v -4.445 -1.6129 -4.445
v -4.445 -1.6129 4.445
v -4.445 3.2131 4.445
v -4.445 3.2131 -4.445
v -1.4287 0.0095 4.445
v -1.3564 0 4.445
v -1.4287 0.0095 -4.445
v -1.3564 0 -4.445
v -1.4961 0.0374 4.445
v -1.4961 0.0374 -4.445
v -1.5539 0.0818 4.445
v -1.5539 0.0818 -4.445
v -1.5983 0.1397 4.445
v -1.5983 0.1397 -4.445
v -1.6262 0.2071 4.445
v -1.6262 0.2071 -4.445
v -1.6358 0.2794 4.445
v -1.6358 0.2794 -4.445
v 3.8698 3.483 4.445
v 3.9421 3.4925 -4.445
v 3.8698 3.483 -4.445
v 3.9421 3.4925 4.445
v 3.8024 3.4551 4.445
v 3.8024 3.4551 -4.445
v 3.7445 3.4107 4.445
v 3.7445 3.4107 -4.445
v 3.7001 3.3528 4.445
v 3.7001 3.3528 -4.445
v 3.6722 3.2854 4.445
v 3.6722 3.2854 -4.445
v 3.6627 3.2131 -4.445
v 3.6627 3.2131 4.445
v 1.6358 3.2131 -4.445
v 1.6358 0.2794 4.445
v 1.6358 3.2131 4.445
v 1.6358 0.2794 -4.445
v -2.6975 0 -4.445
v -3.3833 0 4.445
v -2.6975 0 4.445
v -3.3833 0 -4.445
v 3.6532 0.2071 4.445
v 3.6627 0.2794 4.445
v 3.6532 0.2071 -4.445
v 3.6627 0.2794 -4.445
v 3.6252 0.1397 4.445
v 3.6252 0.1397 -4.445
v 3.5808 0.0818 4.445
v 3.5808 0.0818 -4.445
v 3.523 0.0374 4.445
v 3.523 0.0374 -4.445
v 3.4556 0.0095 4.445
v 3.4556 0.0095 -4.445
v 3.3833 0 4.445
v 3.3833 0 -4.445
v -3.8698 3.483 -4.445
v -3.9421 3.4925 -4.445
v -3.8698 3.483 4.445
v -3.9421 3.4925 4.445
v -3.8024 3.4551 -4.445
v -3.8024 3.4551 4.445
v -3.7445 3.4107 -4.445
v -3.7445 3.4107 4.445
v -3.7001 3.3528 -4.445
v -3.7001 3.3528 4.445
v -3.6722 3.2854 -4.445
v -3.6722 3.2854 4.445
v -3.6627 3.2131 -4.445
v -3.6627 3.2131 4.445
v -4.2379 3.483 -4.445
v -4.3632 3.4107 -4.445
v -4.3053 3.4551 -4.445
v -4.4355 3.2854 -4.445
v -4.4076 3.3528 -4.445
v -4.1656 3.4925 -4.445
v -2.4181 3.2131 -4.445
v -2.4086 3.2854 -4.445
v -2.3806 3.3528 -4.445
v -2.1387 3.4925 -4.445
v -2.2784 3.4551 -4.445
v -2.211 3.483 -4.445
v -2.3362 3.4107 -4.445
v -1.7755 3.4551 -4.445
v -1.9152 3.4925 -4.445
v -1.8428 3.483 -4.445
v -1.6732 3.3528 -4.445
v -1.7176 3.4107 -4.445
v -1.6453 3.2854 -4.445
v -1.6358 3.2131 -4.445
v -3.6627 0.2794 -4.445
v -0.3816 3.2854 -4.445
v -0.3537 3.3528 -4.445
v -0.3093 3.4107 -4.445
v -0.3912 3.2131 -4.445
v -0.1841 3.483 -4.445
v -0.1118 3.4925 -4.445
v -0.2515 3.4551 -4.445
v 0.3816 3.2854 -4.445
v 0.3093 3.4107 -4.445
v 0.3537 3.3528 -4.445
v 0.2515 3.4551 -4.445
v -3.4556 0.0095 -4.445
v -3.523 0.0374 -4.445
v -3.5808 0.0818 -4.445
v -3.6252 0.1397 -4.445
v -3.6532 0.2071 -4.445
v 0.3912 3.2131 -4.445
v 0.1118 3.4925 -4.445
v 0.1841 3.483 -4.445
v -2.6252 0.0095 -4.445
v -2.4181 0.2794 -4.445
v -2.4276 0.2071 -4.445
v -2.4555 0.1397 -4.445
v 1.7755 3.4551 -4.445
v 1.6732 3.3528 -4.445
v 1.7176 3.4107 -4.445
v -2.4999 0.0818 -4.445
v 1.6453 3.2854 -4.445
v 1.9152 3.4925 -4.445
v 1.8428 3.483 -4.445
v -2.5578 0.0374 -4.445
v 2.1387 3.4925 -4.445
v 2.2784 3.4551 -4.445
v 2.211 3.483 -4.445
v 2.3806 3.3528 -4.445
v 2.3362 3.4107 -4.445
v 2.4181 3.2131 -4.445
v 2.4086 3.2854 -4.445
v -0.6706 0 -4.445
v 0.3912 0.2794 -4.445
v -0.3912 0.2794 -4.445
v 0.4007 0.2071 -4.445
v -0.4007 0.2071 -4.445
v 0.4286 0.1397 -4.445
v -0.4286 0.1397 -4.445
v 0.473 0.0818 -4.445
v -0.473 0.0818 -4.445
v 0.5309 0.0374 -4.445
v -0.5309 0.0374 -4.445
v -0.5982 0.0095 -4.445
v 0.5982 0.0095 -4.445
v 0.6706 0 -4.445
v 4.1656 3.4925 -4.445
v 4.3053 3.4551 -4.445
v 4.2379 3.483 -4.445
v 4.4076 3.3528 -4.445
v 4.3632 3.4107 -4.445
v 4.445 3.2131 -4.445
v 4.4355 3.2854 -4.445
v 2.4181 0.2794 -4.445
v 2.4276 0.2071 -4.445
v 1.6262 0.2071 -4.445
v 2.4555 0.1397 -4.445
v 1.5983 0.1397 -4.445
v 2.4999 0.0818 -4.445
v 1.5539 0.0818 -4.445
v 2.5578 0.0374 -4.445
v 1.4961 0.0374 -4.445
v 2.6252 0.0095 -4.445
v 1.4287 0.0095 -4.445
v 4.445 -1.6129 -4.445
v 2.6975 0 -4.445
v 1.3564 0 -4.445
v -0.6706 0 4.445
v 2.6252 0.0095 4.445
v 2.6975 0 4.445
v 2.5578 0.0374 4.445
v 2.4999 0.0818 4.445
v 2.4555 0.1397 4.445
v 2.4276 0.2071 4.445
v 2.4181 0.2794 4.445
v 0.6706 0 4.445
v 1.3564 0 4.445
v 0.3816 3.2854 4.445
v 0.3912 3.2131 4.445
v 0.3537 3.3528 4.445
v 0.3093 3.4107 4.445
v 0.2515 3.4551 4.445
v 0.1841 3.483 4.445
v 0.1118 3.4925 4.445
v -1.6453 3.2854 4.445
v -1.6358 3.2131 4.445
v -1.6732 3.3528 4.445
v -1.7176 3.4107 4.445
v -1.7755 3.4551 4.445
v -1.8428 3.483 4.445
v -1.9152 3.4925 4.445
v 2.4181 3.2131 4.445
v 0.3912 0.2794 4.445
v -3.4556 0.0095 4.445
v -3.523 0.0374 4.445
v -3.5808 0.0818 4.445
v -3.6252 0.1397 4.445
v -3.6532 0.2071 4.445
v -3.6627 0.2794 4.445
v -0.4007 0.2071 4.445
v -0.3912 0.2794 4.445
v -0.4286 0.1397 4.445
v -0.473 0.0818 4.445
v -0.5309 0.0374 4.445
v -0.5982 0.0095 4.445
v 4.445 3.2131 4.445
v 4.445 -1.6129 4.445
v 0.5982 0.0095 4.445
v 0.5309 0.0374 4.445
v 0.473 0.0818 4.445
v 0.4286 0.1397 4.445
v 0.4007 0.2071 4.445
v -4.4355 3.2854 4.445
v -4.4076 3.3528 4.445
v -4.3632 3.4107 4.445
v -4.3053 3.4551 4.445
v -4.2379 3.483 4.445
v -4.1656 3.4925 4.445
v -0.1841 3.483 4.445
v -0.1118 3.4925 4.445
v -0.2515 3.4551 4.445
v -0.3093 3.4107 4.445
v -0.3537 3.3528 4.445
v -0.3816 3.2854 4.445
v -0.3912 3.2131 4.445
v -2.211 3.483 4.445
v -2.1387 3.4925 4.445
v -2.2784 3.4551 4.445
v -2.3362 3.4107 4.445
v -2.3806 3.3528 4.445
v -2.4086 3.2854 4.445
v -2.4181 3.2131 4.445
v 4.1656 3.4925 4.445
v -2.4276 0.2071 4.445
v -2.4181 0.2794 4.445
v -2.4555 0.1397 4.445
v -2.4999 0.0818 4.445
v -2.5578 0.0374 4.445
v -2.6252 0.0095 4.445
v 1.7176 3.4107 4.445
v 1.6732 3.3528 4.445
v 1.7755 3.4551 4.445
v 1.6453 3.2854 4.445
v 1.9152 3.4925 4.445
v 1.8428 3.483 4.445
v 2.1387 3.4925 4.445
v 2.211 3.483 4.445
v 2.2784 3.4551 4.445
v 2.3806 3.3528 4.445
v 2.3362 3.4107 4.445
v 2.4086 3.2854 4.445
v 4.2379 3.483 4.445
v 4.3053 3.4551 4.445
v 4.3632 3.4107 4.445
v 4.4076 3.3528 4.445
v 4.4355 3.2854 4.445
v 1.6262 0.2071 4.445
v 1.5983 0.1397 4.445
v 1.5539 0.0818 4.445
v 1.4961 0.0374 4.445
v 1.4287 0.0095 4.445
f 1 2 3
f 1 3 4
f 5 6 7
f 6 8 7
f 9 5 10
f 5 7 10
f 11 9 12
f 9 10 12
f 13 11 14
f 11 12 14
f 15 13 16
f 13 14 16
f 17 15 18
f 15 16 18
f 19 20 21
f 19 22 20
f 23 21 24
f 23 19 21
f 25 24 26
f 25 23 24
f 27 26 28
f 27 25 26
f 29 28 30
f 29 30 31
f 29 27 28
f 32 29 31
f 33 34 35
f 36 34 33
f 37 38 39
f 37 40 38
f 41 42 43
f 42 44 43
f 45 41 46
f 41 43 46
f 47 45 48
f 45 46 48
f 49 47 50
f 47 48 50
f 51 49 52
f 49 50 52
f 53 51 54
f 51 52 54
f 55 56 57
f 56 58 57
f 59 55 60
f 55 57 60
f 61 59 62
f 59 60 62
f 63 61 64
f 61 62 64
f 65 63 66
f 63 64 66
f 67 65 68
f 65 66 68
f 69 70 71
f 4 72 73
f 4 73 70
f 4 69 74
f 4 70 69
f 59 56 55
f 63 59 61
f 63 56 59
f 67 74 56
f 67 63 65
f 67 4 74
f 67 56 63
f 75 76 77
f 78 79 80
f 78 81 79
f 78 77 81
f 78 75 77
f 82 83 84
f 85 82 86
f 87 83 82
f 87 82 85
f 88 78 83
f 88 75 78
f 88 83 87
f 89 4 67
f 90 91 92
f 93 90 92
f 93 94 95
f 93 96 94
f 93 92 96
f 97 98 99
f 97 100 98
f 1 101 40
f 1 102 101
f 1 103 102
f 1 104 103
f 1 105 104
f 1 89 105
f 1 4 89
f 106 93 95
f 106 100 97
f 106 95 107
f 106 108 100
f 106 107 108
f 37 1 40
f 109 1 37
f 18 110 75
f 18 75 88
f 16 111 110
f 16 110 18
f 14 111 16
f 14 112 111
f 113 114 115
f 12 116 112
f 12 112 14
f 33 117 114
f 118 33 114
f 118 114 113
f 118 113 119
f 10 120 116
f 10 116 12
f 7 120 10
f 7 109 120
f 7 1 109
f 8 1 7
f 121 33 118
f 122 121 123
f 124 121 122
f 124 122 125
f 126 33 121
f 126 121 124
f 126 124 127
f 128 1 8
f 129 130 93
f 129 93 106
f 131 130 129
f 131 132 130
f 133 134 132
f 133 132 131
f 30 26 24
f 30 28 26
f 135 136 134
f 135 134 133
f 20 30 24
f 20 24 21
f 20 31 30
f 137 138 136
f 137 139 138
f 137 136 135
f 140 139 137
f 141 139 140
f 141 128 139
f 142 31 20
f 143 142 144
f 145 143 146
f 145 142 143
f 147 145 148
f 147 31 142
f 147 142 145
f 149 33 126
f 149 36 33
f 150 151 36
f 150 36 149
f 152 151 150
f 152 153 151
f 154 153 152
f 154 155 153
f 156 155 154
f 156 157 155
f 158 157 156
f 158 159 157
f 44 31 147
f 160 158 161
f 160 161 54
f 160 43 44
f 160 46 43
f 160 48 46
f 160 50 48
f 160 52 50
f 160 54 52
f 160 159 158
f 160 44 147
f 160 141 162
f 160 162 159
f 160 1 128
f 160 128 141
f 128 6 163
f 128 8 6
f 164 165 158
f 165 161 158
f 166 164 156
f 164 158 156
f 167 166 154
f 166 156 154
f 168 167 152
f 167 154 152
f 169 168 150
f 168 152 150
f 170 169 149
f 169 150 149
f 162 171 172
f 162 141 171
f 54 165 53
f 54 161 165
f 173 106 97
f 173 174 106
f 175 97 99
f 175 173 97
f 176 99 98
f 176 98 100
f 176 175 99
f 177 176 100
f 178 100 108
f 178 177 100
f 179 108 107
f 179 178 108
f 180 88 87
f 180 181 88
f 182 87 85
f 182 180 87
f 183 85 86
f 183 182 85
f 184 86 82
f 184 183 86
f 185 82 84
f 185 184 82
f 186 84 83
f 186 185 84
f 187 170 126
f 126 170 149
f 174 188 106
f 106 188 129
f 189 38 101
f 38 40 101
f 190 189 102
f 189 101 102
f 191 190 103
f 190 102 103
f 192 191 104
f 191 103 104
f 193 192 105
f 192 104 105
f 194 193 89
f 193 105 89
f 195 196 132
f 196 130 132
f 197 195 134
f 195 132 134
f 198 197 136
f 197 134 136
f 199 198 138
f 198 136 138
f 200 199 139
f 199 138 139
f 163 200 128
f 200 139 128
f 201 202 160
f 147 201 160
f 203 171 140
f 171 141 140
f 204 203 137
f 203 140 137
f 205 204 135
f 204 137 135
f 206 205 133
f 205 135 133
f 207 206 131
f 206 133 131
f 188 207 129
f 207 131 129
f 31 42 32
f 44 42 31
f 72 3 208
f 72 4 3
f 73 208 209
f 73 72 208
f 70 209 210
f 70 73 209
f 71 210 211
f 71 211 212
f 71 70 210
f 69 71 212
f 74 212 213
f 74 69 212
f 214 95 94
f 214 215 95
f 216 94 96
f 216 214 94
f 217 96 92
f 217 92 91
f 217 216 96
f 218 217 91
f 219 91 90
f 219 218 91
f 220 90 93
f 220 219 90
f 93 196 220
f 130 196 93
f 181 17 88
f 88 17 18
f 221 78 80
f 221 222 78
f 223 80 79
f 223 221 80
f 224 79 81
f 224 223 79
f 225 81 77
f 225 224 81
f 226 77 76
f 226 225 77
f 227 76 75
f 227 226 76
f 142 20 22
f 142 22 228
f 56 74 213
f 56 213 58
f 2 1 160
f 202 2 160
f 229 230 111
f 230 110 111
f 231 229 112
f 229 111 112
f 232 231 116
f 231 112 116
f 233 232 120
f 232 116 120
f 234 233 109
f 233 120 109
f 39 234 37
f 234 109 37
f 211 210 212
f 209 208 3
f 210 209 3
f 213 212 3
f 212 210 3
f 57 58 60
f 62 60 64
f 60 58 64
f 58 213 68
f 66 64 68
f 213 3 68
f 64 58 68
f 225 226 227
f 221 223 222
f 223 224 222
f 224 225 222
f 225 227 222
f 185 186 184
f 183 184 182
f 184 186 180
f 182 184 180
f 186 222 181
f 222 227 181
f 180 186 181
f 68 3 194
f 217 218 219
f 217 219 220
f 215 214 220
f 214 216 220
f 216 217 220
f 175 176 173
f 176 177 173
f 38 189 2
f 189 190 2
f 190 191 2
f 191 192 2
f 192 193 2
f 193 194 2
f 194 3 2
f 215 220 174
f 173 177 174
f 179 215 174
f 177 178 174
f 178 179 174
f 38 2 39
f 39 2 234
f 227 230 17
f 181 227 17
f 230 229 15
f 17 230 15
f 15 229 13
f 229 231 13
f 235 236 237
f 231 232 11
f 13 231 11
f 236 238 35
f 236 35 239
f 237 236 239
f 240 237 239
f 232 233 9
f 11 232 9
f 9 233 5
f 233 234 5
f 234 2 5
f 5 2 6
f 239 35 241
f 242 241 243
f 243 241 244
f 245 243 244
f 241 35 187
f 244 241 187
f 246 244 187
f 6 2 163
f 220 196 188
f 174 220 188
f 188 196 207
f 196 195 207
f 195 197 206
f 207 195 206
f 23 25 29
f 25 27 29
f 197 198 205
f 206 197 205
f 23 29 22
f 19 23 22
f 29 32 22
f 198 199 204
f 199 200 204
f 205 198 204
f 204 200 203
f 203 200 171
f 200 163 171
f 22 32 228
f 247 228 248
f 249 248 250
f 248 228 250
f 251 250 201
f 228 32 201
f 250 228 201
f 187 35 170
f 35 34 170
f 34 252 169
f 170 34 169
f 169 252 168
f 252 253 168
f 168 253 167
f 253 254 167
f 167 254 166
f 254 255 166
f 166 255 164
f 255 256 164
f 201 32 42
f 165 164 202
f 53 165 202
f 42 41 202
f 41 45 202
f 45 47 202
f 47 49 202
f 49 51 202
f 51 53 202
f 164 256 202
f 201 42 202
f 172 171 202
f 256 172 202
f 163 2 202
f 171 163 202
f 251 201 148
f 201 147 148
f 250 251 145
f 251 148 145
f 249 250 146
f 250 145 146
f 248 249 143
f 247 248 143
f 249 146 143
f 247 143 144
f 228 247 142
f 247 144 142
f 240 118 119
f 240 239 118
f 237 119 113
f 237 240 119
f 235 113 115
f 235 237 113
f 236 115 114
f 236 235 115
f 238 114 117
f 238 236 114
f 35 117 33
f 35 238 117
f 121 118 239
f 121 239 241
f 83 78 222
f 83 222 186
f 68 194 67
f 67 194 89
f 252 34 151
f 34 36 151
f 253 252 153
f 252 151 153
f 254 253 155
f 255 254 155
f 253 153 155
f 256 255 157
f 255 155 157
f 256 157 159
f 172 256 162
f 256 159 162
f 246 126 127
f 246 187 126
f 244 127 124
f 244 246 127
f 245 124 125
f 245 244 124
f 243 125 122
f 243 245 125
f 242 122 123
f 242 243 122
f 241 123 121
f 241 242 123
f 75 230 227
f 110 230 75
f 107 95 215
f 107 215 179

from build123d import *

# Parameters (mm, degrees)
BOSS_EXTRUDE1_START = -1.6129
SKETCH2_W           = 8.89
SKETCH2_H           = 8.89
BOSS_EXTRUDE1_DEPTH = 5.1054
SKETCH3_W           = 1.2446
SKETCH3_H           = 8.89
CUT_EXTRUDE1_DEPTH  = 8.1912173
FILLET1_R           = 0.2794


with BuildPart() as part:
    # Sketch2 → Boss-Extrude1 (new body)
    with BuildSketch(Plane(origin=(0, 0, 0), x_dir=(1, 0, 0), z_dir=(0, 1, 0)).offset(BOSS_EXTRUDE1_START)):
        Rectangle(SKETCH2_W, SKETCH2_H)
    extrude(amount=BOSS_EXTRUDE1_DEPTH)

    # Sketch3 → Cut-Extrude1 (cut, through all)
    with BuildSketch(Plane(origin=(0, 0, 0), x_dir=(1, 0, 0), z_dir=(0, 1, 0))):
        with Locations((-3.04038, 0)):
            Rectangle(SKETCH3_W, SKETCH3_H)
        with Locations((-1.01346, 0)):
            Rectangle(SKETCH3_W, SKETCH3_H)
        with Locations((1.01346, 0)):
            Rectangle(SKETCH3_W, SKETCH3_H)
        with Locations((3.04038, 0)):
            Rectangle(SKETCH3_W, SKETCH3_H)
    extrude(amount=CUT_EXTRUDE1_DEPTH, mode=Mode.SUBTRACT)

    # Fillet1
    fillet1_edges = [part.edges().sort_by_distance(p)[0] for p in [
        (-4.445, 3.4925, 0),
        (-2.41808, 3.4925, 0),
        (-3.66268, 0, 0),
        (-3.66268, 3.4925, 0),
        (-2.41808, 0, 0),
        (4.445, 3.4925, 0),
        (-1.63576, 0, 0),
        (-0.39116, 3.4925, 0),
        (-1.63576, 3.4925, 0),
        (-0.39116, 0, 0),
        (0.39116, 0, 0),
        (1.63576, 3.4925, 0),
        (0.39116, 3.4925, 0),
        (1.63576, 0, 0),
        (2.41808, 0, 0),
        (3.66268, 3.4925, 0),
        (2.41808, 3.4925, 0),
        (3.66268, 0, 0),
    ]]
    fillet(fillet1_edges, radius=FILLET1_R)


solid = part.part
